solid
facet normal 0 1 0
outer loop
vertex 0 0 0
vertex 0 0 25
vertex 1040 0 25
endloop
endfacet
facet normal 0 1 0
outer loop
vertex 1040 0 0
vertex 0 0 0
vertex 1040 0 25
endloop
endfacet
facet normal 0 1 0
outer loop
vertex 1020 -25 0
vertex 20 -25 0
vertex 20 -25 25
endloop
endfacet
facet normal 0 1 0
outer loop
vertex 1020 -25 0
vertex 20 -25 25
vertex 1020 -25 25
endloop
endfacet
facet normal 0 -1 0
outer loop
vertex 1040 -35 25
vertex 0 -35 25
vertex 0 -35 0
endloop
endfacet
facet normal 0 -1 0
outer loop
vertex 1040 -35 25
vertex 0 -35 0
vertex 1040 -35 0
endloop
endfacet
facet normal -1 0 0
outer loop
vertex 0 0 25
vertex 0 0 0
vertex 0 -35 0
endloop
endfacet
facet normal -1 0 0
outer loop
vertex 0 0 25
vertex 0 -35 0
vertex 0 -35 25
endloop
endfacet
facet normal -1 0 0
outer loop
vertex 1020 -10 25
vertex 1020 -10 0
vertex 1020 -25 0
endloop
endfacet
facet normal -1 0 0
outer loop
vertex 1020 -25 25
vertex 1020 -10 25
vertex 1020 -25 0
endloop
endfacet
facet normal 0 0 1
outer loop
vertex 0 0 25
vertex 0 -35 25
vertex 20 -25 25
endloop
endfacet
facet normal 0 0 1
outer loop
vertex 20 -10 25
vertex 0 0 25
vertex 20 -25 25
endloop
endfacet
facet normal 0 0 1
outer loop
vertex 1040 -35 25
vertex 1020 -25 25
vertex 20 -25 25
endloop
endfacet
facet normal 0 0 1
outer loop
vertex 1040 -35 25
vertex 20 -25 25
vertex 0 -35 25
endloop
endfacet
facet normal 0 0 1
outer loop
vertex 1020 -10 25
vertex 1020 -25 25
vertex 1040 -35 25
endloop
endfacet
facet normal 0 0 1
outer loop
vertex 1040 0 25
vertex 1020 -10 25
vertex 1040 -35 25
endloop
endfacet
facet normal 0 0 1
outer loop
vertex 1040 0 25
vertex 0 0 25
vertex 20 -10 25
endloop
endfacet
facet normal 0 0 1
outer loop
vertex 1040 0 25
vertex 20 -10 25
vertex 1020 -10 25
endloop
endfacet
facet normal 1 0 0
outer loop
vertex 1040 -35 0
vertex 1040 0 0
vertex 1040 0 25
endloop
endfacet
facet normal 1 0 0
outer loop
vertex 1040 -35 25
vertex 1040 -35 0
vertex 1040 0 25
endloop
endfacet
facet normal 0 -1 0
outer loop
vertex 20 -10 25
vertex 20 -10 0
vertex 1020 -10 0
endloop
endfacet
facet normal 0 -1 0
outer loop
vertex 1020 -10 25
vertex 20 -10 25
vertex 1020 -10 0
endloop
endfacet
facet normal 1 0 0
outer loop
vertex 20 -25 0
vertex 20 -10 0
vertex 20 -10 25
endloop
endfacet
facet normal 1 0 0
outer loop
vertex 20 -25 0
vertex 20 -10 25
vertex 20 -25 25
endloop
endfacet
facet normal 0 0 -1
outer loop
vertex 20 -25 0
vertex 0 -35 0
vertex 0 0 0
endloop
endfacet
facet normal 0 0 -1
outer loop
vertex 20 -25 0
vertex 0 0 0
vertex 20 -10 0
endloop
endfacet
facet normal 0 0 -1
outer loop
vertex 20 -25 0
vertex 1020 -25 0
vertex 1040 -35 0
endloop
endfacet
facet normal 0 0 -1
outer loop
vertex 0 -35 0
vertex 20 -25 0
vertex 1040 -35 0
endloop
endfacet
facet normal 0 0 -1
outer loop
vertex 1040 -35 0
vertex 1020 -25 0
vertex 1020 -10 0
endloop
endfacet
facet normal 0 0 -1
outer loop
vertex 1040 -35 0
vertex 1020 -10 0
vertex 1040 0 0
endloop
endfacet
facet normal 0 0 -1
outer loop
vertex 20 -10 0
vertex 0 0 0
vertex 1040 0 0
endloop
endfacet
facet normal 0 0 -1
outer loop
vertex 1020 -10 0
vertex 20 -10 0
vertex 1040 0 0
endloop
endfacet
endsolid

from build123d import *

# Parameters (mm, degrees)
F0_W     = 1040
F0_H     = 25
F1_DEPTH = 35
F2_W     = 1000
F2_H     = 15
F3_DEPTH = 25.001


with BuildPart() as f1:
    # F0 (on Front) → F1 (new body)
    with BuildSketch(Plane.XZ):
        with Locations((520, 12.5)):
            Rectangle(F0_W, F0_H)
    extrude(amount=F1_DEPTH)

    # F2 (on face) → F3 (cut, through all)
    with BuildSketch(Plane(origin=(0, 0, 0), x_dir=(1, 0, 0), z_dir=(0, 0, -1))):
        with Locations((520, 17.5)):
            Rectangle(F2_W, F2_H)
    extrude(amount=-F3_DEPTH, mode=Mode.SUBTRACT)


solid = f1.part
